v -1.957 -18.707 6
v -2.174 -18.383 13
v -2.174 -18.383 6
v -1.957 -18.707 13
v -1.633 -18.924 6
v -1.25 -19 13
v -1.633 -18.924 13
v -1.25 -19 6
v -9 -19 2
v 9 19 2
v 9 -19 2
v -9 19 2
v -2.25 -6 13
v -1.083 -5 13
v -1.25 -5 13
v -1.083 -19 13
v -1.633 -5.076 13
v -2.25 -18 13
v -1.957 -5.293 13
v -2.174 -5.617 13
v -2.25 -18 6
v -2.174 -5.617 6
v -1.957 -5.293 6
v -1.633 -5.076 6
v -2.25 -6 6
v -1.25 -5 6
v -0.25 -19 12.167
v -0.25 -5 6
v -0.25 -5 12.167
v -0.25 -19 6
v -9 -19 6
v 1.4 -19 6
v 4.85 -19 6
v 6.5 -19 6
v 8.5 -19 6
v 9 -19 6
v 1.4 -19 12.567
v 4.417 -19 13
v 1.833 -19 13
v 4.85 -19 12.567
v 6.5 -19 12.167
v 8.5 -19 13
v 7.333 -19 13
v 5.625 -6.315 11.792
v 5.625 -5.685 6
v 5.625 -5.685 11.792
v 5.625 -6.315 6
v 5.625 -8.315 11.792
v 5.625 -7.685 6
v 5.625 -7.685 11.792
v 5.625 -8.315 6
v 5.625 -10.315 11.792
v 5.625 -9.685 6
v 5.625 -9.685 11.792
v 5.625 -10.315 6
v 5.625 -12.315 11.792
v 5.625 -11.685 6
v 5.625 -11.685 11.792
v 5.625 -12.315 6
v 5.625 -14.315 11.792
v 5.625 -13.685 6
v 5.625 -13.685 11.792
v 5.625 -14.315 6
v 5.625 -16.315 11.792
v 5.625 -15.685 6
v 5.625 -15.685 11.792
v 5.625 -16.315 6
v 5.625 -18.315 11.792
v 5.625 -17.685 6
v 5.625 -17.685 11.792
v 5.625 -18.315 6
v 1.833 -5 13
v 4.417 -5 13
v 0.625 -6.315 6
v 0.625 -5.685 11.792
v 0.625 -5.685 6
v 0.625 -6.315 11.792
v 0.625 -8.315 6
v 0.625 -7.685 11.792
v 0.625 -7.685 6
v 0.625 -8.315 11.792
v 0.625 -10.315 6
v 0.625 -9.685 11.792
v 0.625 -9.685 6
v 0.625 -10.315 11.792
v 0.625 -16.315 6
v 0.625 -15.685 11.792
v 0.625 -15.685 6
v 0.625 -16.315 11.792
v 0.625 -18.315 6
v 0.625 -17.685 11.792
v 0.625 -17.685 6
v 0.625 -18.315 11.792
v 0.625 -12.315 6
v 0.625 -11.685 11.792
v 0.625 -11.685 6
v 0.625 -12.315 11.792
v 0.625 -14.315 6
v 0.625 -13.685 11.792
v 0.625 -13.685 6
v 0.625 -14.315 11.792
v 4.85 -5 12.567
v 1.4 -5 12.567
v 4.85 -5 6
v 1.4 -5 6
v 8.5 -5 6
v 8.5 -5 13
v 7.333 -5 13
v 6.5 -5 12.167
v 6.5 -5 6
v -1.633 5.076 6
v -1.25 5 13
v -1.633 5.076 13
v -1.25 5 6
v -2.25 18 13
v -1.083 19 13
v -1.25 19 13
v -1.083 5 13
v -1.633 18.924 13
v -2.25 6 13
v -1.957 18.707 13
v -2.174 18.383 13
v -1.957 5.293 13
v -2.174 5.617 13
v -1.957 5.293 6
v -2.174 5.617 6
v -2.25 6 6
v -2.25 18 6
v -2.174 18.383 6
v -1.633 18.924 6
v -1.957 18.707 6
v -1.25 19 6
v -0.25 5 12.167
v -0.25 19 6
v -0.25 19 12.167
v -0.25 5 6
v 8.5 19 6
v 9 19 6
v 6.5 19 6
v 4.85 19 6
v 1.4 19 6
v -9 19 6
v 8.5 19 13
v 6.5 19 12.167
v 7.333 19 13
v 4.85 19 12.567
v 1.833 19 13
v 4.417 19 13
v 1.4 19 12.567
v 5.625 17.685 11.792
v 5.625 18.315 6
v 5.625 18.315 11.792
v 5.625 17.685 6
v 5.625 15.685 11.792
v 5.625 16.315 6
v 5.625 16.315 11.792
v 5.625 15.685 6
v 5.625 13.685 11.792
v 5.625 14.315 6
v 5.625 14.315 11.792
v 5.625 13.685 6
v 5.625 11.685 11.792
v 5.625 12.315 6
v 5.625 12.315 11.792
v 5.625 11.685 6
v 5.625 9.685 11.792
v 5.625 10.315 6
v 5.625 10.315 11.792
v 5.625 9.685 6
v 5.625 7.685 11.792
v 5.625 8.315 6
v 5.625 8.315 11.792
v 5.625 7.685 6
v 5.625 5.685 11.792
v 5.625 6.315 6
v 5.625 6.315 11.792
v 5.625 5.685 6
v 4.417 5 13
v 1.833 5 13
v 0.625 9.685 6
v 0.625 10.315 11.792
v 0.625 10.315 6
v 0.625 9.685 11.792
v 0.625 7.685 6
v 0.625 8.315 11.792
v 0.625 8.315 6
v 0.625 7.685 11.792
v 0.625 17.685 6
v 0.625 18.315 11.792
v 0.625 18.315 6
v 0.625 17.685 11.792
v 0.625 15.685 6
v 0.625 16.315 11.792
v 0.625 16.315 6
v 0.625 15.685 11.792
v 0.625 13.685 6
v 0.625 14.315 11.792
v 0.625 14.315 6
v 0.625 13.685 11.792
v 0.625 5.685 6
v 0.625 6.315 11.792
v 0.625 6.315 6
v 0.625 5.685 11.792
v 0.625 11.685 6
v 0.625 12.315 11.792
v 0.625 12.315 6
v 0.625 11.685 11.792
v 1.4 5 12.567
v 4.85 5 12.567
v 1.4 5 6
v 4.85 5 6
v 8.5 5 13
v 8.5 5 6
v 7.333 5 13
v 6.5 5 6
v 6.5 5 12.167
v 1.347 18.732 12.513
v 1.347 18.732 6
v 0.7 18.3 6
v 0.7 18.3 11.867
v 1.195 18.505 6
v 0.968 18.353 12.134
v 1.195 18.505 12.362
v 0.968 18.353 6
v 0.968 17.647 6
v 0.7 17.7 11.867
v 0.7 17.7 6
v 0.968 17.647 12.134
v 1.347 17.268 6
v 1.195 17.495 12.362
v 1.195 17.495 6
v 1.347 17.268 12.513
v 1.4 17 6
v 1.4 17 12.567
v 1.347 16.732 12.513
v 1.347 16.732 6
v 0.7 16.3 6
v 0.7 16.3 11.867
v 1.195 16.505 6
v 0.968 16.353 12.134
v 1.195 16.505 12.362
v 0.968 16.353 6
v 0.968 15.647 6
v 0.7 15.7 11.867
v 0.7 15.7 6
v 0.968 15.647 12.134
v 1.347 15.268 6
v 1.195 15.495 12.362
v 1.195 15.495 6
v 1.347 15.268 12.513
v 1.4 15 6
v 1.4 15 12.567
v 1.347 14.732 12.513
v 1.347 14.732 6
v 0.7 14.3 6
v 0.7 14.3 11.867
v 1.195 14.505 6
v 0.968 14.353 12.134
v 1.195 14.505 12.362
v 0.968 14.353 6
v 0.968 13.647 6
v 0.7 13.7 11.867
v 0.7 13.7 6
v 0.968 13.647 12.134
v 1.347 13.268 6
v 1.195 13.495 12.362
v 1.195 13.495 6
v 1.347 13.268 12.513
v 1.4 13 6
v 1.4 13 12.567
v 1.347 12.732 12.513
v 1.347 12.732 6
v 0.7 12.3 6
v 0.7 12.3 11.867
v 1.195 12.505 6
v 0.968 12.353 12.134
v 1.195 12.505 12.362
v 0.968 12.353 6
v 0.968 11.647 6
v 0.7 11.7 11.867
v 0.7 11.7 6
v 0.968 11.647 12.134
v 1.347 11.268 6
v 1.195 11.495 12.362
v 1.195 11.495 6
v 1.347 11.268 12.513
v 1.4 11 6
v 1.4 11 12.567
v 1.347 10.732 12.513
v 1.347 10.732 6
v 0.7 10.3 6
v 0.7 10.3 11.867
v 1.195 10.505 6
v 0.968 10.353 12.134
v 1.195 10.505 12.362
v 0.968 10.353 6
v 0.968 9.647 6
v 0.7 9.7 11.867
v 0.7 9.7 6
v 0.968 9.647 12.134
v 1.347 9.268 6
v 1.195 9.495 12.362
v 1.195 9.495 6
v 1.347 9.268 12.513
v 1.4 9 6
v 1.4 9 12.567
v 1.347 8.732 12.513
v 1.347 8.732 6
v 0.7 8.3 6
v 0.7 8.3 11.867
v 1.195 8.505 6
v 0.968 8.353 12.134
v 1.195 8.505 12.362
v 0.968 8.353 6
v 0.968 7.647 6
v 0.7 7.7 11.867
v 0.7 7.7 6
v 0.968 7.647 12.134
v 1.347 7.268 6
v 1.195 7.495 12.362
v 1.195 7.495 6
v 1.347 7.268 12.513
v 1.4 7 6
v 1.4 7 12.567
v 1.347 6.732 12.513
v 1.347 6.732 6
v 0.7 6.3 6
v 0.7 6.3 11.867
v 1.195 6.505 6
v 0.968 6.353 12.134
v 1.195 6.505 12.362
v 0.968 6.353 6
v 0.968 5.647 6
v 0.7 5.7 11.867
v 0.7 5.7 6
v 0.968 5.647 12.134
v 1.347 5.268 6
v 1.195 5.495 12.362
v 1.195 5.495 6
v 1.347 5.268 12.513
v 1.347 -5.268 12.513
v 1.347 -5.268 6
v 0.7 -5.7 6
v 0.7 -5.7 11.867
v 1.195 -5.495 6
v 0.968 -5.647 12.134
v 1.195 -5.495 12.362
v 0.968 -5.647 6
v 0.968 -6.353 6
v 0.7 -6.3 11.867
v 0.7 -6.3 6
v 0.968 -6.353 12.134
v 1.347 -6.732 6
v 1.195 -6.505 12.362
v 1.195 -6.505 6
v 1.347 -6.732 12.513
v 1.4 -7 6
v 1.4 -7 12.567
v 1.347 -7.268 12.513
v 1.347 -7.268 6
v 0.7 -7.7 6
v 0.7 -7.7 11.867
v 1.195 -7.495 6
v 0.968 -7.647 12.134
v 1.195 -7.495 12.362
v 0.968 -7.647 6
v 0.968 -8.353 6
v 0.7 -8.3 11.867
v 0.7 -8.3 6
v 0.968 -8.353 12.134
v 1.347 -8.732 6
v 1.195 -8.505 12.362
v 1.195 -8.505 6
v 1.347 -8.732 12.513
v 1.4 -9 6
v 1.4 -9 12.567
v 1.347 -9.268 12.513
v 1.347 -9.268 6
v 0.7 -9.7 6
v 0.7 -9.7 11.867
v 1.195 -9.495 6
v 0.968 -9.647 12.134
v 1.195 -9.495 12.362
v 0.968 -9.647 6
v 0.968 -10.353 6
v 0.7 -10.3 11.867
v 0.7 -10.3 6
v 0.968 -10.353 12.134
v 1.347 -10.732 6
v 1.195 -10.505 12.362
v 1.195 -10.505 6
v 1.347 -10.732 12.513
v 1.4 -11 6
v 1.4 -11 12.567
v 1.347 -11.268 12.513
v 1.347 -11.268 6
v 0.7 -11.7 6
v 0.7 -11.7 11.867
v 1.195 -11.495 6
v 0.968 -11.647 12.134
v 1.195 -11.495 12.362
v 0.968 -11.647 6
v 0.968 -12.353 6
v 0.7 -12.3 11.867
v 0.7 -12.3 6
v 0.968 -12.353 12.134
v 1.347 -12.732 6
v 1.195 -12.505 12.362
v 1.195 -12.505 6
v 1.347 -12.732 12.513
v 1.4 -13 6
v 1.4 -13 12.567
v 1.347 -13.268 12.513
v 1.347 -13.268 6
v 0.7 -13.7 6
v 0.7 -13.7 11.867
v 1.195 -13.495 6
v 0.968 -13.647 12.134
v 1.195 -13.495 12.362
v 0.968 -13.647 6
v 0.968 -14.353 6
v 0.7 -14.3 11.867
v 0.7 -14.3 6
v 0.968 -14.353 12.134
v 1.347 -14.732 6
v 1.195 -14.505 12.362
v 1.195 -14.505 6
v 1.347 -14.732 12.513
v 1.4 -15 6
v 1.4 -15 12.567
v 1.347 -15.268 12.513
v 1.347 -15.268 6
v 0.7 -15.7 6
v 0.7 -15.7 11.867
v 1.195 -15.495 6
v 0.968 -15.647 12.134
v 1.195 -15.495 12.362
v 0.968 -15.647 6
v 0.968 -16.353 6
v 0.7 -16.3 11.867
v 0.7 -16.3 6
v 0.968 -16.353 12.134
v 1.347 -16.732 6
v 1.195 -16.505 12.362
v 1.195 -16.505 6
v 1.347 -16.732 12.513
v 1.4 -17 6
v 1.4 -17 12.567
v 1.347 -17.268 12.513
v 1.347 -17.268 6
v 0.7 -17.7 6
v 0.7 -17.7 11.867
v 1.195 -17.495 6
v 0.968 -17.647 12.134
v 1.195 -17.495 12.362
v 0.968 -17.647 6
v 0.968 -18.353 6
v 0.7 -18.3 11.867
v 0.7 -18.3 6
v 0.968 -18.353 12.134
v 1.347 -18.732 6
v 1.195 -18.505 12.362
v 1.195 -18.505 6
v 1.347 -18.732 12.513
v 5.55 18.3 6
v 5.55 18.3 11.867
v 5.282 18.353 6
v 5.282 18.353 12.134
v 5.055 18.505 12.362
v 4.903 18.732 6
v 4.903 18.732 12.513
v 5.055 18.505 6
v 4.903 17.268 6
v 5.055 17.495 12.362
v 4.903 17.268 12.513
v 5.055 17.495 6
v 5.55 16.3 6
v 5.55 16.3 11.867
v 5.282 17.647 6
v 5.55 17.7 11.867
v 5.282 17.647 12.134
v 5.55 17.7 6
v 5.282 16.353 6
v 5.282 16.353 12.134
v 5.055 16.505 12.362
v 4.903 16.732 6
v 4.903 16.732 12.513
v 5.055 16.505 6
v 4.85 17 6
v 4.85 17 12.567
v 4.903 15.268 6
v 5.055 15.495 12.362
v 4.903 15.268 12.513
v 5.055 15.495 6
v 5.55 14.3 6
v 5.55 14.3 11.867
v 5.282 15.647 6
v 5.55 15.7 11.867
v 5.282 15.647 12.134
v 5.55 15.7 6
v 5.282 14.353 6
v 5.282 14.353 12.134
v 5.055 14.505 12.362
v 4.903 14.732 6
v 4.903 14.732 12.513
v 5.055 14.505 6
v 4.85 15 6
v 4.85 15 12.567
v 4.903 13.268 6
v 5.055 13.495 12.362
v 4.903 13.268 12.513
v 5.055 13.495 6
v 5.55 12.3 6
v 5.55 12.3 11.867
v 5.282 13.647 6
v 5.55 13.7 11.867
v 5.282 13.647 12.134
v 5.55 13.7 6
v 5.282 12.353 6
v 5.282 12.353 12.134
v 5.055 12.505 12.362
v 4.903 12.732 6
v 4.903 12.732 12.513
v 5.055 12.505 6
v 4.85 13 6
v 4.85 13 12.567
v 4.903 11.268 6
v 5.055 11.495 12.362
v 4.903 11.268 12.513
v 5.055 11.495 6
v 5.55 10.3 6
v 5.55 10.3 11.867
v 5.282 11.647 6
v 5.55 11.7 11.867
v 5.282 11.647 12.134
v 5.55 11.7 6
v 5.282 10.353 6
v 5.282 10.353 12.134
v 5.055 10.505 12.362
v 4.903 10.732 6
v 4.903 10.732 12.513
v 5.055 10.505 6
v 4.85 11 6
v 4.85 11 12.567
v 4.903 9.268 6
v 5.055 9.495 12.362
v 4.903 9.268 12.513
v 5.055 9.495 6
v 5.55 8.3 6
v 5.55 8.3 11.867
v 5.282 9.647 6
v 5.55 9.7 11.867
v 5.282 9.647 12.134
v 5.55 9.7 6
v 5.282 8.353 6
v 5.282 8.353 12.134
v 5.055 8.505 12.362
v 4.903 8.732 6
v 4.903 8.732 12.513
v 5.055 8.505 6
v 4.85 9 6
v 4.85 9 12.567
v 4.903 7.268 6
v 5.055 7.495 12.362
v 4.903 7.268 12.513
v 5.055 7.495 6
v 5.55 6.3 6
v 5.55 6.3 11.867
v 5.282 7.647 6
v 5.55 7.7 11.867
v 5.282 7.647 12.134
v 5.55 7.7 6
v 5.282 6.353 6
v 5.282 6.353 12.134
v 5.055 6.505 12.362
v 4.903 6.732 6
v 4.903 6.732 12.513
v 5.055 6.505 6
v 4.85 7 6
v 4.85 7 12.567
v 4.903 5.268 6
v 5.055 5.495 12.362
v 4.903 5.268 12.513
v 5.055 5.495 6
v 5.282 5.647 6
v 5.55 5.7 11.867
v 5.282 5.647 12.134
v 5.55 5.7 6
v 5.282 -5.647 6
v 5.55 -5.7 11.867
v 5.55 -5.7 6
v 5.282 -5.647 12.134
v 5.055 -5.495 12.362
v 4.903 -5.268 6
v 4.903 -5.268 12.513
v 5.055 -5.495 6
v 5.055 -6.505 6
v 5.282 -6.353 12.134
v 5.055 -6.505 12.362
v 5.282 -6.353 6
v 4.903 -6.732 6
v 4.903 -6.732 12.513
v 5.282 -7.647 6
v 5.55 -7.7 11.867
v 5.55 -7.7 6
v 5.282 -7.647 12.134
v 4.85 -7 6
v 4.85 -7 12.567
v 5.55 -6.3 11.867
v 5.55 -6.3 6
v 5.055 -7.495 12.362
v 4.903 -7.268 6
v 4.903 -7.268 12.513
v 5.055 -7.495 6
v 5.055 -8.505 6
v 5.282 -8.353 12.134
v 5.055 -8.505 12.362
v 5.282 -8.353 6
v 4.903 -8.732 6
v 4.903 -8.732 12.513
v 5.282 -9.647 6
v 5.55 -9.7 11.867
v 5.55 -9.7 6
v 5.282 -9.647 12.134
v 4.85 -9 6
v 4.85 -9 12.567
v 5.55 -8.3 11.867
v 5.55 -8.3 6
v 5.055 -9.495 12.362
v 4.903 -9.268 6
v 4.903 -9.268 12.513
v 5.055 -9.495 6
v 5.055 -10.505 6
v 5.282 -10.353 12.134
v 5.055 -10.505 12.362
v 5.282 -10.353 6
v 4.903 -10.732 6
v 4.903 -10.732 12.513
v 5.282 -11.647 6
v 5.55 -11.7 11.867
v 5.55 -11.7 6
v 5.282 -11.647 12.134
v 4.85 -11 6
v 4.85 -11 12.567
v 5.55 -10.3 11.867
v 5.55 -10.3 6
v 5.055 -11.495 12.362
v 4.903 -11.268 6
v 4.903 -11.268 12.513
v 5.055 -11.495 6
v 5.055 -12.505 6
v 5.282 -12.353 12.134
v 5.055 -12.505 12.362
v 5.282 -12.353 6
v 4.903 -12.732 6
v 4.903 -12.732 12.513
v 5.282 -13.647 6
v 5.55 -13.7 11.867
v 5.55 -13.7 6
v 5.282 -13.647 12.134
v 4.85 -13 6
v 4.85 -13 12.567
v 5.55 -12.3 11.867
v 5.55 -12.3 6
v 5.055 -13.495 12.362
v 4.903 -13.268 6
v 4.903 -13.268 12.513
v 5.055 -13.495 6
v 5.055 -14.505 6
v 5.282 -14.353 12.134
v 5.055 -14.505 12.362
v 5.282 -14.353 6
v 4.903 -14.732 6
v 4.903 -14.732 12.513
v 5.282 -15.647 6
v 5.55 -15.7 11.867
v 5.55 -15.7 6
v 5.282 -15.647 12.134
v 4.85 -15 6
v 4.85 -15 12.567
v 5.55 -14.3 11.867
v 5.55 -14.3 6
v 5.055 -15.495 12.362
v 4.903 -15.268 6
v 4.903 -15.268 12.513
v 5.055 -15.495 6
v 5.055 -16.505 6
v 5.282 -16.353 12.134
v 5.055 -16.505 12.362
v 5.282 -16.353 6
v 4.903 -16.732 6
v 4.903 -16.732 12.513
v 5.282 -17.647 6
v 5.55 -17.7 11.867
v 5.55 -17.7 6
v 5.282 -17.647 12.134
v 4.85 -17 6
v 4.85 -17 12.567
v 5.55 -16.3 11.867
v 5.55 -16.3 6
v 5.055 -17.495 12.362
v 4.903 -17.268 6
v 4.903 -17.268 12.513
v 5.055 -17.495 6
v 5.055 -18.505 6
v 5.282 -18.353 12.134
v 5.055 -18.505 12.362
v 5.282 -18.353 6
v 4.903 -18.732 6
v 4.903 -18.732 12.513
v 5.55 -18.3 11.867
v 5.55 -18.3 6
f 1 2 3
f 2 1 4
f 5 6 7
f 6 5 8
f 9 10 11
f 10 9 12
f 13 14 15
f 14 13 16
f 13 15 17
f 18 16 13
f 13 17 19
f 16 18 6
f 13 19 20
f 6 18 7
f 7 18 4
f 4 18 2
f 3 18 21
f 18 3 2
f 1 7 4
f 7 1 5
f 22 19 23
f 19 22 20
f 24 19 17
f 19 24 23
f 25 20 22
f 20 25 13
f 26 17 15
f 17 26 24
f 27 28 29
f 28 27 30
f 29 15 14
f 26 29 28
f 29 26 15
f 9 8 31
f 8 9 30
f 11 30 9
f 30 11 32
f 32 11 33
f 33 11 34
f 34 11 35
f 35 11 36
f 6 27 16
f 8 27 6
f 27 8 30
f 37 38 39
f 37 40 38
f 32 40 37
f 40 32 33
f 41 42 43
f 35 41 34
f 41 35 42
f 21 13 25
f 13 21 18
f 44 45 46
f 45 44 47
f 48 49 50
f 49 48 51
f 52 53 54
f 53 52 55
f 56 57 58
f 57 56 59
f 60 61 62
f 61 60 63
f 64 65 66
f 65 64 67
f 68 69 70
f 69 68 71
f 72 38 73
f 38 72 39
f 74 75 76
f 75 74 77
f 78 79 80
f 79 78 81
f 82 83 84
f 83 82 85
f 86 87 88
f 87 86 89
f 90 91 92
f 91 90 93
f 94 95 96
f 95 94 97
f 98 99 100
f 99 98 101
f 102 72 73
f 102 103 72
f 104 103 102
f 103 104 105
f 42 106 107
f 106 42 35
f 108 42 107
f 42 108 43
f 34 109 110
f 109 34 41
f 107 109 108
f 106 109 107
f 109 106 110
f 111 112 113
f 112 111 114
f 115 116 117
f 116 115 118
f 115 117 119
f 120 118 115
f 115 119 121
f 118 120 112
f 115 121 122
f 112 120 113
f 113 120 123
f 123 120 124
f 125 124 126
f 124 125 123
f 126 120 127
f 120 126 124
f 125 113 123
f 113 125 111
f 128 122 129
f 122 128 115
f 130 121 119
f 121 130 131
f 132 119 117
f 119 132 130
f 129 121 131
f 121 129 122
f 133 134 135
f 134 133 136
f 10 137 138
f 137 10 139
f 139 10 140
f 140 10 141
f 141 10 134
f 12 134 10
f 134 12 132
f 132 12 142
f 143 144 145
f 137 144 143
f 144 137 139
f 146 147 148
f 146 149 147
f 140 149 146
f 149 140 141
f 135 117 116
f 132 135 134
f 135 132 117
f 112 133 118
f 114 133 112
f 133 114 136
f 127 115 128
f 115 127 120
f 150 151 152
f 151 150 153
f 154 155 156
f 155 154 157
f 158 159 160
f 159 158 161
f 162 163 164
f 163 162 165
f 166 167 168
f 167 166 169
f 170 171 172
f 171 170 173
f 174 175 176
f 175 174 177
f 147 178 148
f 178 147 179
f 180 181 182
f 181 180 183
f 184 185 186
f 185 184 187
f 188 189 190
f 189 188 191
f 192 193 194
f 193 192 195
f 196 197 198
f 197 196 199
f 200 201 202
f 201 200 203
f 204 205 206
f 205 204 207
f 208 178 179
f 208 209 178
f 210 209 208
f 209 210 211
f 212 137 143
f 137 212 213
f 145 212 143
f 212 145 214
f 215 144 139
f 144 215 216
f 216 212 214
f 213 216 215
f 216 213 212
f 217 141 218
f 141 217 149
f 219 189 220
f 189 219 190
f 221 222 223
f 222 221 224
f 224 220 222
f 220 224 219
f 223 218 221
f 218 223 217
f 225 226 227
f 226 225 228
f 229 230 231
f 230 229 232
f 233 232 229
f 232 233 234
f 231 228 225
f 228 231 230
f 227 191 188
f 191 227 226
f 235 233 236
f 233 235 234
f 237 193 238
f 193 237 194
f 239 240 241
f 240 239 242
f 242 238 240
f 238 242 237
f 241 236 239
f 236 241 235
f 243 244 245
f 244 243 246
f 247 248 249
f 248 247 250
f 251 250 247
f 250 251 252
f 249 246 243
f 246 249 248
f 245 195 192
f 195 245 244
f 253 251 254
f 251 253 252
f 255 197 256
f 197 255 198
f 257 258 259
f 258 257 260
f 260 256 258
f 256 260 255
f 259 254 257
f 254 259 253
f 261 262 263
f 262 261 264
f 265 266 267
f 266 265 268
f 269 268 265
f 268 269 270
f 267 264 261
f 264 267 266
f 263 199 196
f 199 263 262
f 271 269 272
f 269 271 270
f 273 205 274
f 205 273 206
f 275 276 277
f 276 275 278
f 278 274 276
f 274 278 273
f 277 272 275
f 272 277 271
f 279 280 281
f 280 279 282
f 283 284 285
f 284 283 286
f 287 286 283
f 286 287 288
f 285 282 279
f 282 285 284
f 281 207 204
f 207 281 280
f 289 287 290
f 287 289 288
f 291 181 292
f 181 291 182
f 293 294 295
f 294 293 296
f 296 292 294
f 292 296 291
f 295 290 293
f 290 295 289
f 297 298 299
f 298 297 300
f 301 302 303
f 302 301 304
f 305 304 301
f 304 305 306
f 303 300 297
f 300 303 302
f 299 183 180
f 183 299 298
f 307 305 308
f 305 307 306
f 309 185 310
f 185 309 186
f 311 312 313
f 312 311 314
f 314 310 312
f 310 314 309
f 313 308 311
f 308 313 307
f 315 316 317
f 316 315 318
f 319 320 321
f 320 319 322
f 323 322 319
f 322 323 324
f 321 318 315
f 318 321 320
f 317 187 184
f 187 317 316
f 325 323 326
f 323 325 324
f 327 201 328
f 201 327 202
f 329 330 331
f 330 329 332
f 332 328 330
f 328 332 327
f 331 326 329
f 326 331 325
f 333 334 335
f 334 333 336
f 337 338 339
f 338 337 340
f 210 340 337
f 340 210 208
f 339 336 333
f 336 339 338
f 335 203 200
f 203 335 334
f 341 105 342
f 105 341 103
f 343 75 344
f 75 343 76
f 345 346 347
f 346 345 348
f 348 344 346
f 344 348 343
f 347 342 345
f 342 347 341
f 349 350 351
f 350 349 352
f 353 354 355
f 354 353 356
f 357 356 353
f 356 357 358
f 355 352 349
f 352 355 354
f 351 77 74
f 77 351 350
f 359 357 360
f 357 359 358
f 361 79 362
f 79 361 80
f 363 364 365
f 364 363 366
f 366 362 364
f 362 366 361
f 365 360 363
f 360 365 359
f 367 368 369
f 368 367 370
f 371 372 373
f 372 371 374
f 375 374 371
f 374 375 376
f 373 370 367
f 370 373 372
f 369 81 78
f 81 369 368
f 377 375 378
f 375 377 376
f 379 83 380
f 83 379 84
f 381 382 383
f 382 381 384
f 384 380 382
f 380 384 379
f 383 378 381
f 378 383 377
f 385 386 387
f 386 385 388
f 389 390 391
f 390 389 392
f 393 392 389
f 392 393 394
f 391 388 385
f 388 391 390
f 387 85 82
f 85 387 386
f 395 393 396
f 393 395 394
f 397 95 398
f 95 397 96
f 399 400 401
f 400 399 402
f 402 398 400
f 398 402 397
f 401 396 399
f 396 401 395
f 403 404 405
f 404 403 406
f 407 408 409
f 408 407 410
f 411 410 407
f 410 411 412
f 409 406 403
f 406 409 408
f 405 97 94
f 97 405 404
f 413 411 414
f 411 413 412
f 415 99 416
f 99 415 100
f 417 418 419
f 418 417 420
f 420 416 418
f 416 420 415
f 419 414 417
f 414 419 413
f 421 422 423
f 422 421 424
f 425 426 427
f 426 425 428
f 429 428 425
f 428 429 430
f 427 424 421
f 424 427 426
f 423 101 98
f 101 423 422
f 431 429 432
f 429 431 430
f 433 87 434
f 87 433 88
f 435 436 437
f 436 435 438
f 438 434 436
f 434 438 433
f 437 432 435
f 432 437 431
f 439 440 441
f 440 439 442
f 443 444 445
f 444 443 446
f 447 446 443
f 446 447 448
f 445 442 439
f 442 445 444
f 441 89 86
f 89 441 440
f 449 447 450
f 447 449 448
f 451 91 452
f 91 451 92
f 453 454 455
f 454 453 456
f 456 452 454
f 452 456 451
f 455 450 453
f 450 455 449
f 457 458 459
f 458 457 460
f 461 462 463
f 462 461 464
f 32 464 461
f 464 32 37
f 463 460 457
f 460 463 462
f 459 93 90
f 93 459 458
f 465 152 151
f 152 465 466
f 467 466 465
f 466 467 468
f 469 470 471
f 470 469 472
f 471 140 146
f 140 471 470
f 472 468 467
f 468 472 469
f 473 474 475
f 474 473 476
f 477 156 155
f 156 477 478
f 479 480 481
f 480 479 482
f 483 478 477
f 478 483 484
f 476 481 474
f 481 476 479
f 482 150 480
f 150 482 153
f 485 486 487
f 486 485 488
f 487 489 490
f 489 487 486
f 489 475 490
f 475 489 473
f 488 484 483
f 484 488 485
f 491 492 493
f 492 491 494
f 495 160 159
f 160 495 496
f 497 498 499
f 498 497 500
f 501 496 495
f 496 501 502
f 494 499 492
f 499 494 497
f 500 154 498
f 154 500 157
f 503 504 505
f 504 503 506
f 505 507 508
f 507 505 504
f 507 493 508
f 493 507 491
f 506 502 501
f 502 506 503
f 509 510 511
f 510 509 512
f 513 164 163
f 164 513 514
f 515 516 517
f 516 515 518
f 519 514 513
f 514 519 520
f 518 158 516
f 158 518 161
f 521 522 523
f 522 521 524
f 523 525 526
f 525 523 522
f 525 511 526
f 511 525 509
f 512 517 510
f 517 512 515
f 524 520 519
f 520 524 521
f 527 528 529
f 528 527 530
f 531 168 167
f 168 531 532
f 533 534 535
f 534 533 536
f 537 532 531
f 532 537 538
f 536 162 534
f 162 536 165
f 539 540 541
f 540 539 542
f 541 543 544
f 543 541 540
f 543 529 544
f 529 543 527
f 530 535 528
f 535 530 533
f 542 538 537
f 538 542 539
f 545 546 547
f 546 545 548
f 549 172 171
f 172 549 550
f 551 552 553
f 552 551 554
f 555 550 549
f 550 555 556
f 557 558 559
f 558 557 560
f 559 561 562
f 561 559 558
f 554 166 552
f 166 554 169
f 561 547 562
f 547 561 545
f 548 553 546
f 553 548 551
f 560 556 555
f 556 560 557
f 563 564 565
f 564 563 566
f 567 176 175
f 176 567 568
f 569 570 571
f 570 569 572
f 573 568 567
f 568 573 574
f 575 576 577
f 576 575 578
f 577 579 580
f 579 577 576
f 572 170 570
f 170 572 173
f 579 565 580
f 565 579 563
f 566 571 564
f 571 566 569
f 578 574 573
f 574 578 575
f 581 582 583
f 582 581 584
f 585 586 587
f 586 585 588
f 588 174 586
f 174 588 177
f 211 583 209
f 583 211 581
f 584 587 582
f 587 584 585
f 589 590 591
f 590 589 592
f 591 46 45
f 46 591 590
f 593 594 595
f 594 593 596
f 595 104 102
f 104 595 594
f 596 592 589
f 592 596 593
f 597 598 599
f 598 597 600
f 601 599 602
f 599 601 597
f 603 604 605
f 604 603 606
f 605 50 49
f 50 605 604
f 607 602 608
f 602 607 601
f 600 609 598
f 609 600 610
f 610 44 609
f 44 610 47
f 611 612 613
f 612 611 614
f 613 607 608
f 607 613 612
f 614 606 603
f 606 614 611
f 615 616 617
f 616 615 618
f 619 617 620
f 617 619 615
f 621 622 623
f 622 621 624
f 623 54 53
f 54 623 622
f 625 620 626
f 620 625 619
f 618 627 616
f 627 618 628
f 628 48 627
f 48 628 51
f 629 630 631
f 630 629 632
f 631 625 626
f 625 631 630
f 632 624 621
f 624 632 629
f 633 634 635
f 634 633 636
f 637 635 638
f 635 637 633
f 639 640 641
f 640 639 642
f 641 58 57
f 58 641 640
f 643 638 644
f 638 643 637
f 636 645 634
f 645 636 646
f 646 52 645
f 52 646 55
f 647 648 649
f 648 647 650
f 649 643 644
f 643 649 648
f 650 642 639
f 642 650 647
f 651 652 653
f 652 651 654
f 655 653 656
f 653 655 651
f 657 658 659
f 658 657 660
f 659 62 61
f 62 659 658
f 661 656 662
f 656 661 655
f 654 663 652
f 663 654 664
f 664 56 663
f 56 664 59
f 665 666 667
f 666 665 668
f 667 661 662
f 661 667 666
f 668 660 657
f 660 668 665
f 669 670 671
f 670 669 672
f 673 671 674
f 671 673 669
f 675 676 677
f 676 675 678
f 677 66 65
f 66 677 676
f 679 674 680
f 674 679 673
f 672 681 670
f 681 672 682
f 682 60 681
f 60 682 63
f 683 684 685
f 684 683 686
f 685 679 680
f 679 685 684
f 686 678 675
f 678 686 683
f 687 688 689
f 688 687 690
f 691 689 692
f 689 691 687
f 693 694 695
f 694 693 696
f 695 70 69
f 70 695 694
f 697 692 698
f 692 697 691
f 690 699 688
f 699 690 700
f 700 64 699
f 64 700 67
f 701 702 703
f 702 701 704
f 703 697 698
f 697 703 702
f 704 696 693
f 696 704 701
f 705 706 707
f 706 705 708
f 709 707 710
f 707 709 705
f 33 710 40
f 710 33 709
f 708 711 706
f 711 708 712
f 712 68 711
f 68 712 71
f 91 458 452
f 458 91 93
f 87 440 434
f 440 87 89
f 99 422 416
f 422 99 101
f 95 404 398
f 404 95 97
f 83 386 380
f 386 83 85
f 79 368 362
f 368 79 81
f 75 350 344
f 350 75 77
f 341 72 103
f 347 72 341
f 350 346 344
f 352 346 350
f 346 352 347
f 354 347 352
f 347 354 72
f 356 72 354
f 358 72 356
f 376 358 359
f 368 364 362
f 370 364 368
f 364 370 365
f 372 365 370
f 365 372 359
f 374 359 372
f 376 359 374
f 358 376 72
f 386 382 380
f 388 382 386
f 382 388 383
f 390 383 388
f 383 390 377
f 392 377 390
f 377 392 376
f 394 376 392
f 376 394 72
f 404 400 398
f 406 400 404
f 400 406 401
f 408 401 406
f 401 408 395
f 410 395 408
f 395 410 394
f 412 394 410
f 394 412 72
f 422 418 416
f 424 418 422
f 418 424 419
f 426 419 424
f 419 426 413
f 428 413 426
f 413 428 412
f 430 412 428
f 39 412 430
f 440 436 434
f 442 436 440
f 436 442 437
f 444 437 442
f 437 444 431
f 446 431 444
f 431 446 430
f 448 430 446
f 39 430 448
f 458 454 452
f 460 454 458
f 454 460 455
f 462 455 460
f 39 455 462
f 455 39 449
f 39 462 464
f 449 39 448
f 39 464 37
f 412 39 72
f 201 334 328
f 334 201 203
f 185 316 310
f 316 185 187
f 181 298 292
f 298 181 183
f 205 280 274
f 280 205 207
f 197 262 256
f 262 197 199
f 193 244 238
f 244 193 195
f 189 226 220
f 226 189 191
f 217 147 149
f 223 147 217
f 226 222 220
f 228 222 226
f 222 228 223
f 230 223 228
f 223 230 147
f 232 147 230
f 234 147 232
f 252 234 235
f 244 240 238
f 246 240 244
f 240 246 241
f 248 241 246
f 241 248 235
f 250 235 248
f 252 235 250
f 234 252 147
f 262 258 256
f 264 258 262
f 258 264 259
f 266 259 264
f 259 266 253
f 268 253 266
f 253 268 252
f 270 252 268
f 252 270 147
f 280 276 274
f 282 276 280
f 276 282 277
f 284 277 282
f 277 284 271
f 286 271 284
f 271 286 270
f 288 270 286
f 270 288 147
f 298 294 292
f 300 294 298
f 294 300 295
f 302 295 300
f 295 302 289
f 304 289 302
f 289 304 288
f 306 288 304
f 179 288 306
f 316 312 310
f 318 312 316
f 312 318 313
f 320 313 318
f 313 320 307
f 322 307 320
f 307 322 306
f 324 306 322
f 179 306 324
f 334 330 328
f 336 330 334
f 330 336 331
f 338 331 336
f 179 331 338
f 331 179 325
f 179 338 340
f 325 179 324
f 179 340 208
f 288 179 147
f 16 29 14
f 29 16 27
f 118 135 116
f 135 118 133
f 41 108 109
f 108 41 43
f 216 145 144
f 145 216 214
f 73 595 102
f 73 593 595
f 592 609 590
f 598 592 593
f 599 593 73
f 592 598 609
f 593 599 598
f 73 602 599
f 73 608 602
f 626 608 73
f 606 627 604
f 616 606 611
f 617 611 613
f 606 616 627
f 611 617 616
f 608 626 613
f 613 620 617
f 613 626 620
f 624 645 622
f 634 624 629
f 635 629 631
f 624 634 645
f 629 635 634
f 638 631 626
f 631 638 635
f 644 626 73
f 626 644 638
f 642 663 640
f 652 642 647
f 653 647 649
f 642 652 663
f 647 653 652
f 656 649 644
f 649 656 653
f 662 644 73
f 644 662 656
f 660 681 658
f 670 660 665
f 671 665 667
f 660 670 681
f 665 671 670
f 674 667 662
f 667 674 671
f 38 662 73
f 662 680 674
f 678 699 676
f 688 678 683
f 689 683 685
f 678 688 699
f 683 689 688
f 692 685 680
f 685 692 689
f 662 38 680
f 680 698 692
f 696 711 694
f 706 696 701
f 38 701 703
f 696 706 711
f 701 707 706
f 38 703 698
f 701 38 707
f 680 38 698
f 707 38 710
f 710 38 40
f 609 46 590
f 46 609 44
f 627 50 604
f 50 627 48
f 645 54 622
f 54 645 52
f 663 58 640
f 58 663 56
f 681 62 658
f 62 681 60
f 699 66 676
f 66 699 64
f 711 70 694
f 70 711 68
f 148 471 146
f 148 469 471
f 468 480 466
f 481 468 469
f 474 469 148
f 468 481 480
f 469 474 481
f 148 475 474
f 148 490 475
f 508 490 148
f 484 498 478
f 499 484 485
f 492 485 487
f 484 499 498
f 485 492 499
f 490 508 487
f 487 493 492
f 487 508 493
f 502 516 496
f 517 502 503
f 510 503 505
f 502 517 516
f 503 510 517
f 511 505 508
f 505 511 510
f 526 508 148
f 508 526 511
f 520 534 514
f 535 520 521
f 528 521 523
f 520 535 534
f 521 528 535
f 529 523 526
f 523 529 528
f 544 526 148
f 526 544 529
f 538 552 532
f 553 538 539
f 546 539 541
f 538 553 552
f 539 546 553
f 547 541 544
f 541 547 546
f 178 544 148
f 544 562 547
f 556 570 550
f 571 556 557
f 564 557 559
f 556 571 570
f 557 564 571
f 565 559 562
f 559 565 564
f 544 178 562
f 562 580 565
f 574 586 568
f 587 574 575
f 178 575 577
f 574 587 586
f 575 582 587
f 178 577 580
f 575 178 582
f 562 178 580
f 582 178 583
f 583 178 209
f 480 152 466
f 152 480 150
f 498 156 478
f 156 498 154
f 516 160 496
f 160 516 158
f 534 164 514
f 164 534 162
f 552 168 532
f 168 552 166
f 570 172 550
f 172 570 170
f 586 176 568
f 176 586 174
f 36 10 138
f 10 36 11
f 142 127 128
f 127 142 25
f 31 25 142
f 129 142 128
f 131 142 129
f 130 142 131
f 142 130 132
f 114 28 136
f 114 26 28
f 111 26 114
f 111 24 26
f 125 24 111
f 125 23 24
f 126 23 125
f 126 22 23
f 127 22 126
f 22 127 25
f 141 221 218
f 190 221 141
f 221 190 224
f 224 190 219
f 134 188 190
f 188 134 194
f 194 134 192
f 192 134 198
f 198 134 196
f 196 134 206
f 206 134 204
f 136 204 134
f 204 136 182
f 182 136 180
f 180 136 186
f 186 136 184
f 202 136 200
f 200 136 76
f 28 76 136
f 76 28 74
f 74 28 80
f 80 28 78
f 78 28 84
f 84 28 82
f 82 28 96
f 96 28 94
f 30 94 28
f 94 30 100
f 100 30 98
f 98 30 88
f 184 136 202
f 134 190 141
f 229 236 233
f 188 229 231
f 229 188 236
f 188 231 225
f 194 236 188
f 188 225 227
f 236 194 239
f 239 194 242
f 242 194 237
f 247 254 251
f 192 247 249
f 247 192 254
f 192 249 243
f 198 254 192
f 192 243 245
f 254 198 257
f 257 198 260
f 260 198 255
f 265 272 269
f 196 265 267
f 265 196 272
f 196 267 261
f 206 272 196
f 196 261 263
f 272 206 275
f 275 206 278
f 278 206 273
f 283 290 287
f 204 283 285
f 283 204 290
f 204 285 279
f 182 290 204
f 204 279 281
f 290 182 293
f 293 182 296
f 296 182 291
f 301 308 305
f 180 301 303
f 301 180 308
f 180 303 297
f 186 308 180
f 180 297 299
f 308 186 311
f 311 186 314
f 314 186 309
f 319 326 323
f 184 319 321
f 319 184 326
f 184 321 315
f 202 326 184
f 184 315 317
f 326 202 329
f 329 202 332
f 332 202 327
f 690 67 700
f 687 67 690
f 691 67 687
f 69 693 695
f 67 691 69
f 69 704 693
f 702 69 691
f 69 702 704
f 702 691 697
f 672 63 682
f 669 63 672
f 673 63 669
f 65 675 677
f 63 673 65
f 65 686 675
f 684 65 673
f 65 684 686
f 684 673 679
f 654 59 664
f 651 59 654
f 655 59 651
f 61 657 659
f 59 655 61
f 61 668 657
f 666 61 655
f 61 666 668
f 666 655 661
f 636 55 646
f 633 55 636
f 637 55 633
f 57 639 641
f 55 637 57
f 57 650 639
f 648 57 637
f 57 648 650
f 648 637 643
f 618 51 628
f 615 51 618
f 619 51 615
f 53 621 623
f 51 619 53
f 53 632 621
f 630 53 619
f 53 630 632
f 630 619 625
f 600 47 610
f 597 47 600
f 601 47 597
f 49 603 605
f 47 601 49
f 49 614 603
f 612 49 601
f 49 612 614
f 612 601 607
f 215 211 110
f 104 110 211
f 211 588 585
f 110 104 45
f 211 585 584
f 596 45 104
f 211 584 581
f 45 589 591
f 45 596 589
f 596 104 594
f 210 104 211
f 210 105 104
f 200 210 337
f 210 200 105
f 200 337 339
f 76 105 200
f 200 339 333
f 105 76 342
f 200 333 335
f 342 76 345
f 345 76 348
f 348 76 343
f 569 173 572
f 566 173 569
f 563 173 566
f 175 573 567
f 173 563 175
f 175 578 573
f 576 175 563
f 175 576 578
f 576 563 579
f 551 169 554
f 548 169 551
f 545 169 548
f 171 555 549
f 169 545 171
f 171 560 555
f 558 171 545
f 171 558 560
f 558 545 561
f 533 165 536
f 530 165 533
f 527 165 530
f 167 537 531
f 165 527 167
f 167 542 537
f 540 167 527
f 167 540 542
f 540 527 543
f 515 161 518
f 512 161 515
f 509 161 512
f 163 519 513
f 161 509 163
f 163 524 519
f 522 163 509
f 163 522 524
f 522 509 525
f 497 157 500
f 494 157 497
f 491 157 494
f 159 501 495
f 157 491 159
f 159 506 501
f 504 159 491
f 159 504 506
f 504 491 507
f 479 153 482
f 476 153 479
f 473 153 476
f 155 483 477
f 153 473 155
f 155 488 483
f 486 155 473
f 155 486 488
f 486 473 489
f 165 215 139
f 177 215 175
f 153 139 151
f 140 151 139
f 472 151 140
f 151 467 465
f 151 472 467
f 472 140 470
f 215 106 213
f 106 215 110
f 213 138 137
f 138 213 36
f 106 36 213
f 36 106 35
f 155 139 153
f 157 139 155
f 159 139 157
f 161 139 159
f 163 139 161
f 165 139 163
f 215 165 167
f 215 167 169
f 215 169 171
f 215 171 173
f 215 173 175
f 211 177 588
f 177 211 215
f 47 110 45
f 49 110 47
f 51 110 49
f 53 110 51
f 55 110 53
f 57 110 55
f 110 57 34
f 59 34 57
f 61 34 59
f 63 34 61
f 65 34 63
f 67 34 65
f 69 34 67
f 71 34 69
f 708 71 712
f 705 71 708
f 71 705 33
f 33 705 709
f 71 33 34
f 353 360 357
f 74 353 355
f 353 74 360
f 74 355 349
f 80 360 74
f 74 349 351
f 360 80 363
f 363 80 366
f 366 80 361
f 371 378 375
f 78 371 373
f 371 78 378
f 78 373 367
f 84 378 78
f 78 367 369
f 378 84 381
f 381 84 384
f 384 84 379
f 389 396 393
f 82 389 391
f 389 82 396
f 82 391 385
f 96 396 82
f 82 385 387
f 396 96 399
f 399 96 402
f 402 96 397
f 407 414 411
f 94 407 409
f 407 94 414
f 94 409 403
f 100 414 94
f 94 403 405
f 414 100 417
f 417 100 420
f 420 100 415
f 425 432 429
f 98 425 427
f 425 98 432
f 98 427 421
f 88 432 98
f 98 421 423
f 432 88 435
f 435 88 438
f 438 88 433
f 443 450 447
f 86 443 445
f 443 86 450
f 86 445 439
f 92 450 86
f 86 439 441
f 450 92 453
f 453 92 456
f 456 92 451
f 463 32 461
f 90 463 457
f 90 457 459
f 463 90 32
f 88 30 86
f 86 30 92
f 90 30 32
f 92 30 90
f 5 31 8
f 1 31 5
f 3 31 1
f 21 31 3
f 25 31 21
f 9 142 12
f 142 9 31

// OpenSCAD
// Kossel Mini carriage for IGUS DryLin TWE-04-12
// Licence: CC BY-SA 3.0, http://creativecommons.org/licenses/by-sa/3.0/
// Author: Dominik Scholz <schlotzz@schlotzz.com> and contributors
// Based upon: https://github.com/jcrocholl/kossel/blob/master/carriage.scad by jcrocholl
// visit: http://www.schlotzz.com


// Increase this if your slicer or printer make holes too tight.
extra_radius = 0.4;

// OD = outside diameter, corner to corner.
m3_nut_od = 6.1;
m3_nut_radius = m3_nut_od/2 + 0.2 + extra_radius;
m3_washer_radius = 3.5 + extra_radius;

// Major diameter of metric 3mm thread.
m3_major = 2.85;
m3_radius = m3_major/2 + extra_radius;
m3_wide_radius = m3_major/2 + extra_radius + 0.2;



separation = 50;
thickness = 4;

horn_thickness = 13;
horn_x = 8;

belt_width = 5;
belt_x = 5.6;
belt_z = 7;



module carriage()
{

	clearance = 0.125;

	// timing belt, up and down
	for (x = [-belt_x, belt_x])
		translate([x, 0, belt_z + belt_width / 2])
			% cube([1.7, 100, belt_width], center = true);


	difference()
	{

	    union()
		{
			// main body
			translate([0, 0, thickness / 2 + 2])
				cube([18, 38, thickness], center = true);

			


			// belt clamps for GT2
			difference()
			{
				union()
				{
					for (y = [-12, 12])
					{
						union()
						{
							translate([-0.5 - clearance * 2, y, horn_thickness / 2 + 1])
								cube([1, 14, horn_thickness - 2], center = true);
							translate([-1 - clearance * 2, y, horn_thickness / 2 + 1])
								cube([2, 12, horn_thickness - 2], center = true);
							for (n = [-6, 6])
								translate([-1 - clearance * 2, y + n, horn_thickness / 2 + 1])
									cylinder(r = 1, h = horn_thickness - 2, center = true, $fn = 16);

							translate([3.25 - clearance, y, horn_thickness / 2 + 1])
								cube([5, 14, horn_thickness - 2], center = true);

							translate([7.5, y, horn_thickness / 2 + 1])
								cube([2, 14, horn_thickness - 2], center = true);
						}
					}
				}

				// tooth cutout
				for (x = [1.125 - 0.300 - clearance, 5.375 + 0.30 - clearance])
				{
					for (y = [0 : 19])
					{
						translate([x, 19 - y * 2, 6 - 0.001])
							cylinder(r = 0.7, h = horn_thickness / 2 + 1, $fn = 16);
					}
				}

				// cutout for easier inserting of belt
				for (x = [0.5 - clearance, 6 - clearance])
					translate([x, 0, horn_thickness])
						rotate([0, 45, 0])
							cube([2 + clearance / 2, 50, 2 + clearance / 2], center = true);

			}

		}

		

	}

}

carriage();
